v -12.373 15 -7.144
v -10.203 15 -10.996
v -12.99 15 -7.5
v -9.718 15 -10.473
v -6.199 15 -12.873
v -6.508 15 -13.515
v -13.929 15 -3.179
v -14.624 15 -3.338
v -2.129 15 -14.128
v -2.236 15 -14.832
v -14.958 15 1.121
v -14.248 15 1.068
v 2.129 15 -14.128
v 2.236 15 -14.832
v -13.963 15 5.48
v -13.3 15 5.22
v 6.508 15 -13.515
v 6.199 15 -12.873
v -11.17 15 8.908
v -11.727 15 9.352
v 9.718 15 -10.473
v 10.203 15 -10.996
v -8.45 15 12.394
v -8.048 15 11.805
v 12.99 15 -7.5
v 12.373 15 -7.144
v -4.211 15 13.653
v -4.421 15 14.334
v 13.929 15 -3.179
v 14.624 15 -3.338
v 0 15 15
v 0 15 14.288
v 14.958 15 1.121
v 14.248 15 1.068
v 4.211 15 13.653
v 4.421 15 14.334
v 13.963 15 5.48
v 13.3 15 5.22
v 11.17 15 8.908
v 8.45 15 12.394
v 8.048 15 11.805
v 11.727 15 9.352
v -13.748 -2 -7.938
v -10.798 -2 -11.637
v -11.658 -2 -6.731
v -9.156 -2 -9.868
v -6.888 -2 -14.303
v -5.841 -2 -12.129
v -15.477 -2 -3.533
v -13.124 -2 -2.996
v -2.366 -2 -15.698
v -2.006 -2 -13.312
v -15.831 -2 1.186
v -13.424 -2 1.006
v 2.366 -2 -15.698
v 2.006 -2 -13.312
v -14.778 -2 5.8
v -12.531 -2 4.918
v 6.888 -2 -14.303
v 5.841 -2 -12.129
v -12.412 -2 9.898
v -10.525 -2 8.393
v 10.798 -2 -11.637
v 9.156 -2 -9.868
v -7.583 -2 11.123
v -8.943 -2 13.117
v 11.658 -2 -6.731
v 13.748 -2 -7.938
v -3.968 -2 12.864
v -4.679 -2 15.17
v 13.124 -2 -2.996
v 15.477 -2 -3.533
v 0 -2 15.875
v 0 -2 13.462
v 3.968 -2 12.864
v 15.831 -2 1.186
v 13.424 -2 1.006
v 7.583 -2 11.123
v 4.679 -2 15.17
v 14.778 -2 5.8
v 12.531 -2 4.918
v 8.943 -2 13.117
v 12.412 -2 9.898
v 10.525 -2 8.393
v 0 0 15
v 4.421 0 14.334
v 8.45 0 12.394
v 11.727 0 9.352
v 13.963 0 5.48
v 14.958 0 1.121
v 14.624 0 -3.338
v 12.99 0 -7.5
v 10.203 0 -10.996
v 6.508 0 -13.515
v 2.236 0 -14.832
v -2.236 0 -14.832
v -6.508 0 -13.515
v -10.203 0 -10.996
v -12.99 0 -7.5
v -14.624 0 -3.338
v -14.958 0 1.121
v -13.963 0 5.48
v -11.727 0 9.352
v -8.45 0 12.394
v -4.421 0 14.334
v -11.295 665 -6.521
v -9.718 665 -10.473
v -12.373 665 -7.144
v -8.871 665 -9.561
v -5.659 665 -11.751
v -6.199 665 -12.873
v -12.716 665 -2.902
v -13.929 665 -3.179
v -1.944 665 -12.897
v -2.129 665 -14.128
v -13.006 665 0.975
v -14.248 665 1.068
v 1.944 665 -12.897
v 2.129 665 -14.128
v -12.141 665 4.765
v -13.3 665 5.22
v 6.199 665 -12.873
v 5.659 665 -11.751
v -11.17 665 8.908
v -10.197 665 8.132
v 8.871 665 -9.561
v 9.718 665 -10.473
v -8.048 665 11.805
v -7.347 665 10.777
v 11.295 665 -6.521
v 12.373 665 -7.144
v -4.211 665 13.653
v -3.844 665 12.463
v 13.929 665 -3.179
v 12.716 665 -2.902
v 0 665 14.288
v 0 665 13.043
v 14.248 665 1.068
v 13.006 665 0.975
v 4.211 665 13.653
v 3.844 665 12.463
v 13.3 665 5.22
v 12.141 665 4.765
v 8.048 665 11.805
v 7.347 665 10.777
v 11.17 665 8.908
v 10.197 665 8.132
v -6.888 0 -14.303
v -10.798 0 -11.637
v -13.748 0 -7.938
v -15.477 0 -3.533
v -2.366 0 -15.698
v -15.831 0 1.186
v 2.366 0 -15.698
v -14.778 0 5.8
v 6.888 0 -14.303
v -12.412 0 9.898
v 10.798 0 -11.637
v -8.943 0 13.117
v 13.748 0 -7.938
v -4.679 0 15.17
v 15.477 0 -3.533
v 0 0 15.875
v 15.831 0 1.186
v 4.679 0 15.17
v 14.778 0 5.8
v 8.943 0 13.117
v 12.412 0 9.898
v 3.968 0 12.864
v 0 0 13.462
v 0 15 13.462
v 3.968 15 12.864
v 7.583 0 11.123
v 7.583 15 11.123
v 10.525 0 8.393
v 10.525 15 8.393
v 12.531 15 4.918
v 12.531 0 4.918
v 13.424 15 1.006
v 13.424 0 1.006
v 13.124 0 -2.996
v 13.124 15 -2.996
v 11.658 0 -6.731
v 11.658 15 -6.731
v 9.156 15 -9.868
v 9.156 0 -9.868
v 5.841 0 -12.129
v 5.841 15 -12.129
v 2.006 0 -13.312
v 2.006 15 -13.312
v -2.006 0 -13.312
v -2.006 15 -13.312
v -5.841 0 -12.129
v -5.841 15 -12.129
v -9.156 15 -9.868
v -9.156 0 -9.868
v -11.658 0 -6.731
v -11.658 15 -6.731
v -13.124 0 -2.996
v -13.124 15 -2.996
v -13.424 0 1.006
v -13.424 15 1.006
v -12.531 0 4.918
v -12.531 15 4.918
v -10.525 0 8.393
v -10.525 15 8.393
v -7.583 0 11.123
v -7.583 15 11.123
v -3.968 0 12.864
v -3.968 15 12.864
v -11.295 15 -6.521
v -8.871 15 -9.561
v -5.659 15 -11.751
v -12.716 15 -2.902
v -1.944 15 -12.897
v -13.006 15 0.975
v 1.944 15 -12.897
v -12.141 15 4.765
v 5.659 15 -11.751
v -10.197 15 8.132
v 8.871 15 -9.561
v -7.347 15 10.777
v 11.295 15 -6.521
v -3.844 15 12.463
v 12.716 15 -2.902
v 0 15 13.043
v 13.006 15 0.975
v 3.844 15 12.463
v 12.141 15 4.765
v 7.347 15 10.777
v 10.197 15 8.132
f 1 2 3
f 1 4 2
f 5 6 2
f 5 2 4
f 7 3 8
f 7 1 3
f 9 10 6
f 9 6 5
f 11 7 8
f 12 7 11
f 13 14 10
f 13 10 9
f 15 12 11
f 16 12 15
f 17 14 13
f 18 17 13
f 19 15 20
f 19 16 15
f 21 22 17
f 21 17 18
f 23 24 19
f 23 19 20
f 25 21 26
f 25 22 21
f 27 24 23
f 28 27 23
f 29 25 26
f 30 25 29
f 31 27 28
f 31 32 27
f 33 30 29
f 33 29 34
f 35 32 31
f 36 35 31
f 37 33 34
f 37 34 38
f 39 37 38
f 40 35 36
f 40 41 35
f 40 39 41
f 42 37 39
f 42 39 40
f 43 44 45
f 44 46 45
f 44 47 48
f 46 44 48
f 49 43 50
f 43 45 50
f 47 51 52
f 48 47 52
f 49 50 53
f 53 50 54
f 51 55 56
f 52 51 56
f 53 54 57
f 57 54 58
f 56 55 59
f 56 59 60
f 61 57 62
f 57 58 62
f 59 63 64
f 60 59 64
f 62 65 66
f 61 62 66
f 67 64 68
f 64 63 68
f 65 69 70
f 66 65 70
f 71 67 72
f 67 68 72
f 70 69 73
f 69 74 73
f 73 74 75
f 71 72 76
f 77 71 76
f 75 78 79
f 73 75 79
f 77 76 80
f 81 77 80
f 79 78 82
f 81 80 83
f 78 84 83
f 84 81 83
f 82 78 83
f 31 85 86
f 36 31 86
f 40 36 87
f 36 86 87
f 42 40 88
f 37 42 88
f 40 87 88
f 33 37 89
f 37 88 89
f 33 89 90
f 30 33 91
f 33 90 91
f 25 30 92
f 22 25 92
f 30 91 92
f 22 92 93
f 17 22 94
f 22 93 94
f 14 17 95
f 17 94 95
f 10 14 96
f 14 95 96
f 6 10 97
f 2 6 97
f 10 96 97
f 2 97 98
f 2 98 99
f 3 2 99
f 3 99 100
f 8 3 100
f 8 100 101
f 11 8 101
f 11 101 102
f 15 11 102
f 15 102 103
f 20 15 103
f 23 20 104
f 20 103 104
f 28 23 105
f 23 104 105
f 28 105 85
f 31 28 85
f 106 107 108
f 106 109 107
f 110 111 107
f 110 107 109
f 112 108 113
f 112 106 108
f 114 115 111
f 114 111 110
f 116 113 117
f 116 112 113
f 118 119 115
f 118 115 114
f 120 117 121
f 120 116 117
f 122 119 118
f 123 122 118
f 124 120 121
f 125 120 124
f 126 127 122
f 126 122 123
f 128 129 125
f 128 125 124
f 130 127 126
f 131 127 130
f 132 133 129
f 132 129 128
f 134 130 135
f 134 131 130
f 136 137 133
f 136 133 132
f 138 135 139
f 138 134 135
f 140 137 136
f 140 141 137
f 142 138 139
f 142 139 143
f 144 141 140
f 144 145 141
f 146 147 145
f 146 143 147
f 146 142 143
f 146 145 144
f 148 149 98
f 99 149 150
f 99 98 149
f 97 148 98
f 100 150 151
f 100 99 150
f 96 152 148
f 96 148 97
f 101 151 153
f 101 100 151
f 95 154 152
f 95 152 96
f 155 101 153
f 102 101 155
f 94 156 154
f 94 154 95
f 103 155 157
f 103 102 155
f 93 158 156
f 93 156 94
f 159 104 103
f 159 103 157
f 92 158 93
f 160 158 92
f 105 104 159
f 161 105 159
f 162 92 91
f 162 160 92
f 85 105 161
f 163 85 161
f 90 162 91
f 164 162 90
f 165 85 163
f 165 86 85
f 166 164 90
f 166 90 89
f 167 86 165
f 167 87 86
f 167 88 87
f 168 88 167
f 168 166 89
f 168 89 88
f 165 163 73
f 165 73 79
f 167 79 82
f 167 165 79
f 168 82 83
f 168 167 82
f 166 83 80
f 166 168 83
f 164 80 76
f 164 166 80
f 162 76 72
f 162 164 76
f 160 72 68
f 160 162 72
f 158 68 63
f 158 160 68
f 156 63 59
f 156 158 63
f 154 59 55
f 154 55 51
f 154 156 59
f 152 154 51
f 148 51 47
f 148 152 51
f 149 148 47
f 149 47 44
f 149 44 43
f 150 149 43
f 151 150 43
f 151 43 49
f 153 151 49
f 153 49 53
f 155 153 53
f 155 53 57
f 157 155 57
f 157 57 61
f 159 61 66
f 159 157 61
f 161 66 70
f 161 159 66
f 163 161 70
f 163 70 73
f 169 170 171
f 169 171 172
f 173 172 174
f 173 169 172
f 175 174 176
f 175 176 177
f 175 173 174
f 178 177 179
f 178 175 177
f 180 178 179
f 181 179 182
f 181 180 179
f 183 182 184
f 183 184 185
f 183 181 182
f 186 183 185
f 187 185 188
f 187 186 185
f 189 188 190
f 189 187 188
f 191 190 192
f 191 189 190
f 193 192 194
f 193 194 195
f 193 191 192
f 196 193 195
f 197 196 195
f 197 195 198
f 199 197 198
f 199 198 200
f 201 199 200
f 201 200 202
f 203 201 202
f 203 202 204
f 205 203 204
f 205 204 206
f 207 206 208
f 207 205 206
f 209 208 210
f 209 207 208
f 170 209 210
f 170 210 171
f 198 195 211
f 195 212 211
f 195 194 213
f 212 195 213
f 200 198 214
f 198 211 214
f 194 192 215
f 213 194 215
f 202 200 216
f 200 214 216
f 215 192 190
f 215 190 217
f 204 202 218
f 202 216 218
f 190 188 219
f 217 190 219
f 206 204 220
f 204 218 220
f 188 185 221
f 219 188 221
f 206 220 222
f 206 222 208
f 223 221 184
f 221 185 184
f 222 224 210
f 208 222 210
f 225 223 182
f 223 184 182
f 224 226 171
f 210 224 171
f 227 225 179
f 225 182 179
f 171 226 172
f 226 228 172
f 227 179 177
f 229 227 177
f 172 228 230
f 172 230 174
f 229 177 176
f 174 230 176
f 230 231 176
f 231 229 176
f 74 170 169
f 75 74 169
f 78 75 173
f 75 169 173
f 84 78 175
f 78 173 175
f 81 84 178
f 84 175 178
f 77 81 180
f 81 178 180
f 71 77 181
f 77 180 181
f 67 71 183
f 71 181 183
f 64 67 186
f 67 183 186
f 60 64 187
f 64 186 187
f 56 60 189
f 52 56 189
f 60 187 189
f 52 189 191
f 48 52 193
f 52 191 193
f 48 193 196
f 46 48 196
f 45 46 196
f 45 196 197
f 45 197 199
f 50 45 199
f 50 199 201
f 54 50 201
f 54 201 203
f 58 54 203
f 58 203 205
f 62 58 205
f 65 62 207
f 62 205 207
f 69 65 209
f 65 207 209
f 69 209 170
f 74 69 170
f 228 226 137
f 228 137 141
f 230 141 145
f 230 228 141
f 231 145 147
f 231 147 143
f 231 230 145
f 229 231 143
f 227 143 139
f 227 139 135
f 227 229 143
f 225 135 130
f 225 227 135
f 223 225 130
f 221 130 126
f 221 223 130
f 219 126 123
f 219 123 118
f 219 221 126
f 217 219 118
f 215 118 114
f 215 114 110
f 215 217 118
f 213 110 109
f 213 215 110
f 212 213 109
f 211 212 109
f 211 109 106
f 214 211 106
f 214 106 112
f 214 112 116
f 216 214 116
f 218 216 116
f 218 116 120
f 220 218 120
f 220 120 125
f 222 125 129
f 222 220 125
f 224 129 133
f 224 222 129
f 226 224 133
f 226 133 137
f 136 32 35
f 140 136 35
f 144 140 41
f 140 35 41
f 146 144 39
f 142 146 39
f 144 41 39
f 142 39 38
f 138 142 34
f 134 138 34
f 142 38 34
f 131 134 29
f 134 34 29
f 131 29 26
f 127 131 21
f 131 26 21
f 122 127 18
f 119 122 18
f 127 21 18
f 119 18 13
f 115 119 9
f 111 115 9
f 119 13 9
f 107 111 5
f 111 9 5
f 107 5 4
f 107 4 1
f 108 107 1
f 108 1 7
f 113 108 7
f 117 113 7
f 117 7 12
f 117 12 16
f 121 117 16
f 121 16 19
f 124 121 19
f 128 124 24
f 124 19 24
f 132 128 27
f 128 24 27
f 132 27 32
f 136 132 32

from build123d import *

# Parameters (mm, degrees)
SKETCH1_R           = 15
SKETCH1_R_2         = 13.462
BOSS_EXTRUDE1_DEPTH = 15
SKETCH4_R           = 14.2875
SKETCH4_R_2         = 13.0429
BOSS_EXTRUDE5_DEPTH = 650
BOSS_EXTRUDE6_START = -2
SKETCH1_4_R         = 15.875
SKETCH1_4_R_2       = 13.462
BOSS_EXTRUDE6_DEPTH = 2


with BuildPart() as part:
    # Sketch1 → Boss-Extrude1 (new body)
    with BuildSketch(Plane(origin=(0, 0, 0), x_dir=(1, 0, 0), z_dir=(0, 1, 0))):
        Circle(SKETCH1_R)
        Circle(SKETCH1_R_2, mode=Mode.SUBTRACT)
    extrude(amount=BOSS_EXTRUDE1_DEPTH)

    # Sketch4 → Boss-Extrude5 (add)
    with BuildSketch(Plane(origin=(0, 15, 0), x_dir=(1, 0, 0), z_dir=(0, 1, 0))):
        Circle(SKETCH4_R)
        Circle(SKETCH4_R_2, mode=Mode.SUBTRACT)
    extrude(amount=BOSS_EXTRUDE5_DEPTH)

    # Sketch1<4> → Boss-Extrude6 (add)
    with BuildSketch(Plane(origin=(0, 0, 0), x_dir=(1, 0, 0), z_dir=(0, 1, 0)).offset(BOSS_EXTRUDE6_START)):
        Circle(SKETCH1_4_R)
        Circle(SKETCH1_4_R_2, mode=Mode.SUBTRACT)
    extrude(amount=BOSS_EXTRUDE6_DEPTH)


solid = part.part
